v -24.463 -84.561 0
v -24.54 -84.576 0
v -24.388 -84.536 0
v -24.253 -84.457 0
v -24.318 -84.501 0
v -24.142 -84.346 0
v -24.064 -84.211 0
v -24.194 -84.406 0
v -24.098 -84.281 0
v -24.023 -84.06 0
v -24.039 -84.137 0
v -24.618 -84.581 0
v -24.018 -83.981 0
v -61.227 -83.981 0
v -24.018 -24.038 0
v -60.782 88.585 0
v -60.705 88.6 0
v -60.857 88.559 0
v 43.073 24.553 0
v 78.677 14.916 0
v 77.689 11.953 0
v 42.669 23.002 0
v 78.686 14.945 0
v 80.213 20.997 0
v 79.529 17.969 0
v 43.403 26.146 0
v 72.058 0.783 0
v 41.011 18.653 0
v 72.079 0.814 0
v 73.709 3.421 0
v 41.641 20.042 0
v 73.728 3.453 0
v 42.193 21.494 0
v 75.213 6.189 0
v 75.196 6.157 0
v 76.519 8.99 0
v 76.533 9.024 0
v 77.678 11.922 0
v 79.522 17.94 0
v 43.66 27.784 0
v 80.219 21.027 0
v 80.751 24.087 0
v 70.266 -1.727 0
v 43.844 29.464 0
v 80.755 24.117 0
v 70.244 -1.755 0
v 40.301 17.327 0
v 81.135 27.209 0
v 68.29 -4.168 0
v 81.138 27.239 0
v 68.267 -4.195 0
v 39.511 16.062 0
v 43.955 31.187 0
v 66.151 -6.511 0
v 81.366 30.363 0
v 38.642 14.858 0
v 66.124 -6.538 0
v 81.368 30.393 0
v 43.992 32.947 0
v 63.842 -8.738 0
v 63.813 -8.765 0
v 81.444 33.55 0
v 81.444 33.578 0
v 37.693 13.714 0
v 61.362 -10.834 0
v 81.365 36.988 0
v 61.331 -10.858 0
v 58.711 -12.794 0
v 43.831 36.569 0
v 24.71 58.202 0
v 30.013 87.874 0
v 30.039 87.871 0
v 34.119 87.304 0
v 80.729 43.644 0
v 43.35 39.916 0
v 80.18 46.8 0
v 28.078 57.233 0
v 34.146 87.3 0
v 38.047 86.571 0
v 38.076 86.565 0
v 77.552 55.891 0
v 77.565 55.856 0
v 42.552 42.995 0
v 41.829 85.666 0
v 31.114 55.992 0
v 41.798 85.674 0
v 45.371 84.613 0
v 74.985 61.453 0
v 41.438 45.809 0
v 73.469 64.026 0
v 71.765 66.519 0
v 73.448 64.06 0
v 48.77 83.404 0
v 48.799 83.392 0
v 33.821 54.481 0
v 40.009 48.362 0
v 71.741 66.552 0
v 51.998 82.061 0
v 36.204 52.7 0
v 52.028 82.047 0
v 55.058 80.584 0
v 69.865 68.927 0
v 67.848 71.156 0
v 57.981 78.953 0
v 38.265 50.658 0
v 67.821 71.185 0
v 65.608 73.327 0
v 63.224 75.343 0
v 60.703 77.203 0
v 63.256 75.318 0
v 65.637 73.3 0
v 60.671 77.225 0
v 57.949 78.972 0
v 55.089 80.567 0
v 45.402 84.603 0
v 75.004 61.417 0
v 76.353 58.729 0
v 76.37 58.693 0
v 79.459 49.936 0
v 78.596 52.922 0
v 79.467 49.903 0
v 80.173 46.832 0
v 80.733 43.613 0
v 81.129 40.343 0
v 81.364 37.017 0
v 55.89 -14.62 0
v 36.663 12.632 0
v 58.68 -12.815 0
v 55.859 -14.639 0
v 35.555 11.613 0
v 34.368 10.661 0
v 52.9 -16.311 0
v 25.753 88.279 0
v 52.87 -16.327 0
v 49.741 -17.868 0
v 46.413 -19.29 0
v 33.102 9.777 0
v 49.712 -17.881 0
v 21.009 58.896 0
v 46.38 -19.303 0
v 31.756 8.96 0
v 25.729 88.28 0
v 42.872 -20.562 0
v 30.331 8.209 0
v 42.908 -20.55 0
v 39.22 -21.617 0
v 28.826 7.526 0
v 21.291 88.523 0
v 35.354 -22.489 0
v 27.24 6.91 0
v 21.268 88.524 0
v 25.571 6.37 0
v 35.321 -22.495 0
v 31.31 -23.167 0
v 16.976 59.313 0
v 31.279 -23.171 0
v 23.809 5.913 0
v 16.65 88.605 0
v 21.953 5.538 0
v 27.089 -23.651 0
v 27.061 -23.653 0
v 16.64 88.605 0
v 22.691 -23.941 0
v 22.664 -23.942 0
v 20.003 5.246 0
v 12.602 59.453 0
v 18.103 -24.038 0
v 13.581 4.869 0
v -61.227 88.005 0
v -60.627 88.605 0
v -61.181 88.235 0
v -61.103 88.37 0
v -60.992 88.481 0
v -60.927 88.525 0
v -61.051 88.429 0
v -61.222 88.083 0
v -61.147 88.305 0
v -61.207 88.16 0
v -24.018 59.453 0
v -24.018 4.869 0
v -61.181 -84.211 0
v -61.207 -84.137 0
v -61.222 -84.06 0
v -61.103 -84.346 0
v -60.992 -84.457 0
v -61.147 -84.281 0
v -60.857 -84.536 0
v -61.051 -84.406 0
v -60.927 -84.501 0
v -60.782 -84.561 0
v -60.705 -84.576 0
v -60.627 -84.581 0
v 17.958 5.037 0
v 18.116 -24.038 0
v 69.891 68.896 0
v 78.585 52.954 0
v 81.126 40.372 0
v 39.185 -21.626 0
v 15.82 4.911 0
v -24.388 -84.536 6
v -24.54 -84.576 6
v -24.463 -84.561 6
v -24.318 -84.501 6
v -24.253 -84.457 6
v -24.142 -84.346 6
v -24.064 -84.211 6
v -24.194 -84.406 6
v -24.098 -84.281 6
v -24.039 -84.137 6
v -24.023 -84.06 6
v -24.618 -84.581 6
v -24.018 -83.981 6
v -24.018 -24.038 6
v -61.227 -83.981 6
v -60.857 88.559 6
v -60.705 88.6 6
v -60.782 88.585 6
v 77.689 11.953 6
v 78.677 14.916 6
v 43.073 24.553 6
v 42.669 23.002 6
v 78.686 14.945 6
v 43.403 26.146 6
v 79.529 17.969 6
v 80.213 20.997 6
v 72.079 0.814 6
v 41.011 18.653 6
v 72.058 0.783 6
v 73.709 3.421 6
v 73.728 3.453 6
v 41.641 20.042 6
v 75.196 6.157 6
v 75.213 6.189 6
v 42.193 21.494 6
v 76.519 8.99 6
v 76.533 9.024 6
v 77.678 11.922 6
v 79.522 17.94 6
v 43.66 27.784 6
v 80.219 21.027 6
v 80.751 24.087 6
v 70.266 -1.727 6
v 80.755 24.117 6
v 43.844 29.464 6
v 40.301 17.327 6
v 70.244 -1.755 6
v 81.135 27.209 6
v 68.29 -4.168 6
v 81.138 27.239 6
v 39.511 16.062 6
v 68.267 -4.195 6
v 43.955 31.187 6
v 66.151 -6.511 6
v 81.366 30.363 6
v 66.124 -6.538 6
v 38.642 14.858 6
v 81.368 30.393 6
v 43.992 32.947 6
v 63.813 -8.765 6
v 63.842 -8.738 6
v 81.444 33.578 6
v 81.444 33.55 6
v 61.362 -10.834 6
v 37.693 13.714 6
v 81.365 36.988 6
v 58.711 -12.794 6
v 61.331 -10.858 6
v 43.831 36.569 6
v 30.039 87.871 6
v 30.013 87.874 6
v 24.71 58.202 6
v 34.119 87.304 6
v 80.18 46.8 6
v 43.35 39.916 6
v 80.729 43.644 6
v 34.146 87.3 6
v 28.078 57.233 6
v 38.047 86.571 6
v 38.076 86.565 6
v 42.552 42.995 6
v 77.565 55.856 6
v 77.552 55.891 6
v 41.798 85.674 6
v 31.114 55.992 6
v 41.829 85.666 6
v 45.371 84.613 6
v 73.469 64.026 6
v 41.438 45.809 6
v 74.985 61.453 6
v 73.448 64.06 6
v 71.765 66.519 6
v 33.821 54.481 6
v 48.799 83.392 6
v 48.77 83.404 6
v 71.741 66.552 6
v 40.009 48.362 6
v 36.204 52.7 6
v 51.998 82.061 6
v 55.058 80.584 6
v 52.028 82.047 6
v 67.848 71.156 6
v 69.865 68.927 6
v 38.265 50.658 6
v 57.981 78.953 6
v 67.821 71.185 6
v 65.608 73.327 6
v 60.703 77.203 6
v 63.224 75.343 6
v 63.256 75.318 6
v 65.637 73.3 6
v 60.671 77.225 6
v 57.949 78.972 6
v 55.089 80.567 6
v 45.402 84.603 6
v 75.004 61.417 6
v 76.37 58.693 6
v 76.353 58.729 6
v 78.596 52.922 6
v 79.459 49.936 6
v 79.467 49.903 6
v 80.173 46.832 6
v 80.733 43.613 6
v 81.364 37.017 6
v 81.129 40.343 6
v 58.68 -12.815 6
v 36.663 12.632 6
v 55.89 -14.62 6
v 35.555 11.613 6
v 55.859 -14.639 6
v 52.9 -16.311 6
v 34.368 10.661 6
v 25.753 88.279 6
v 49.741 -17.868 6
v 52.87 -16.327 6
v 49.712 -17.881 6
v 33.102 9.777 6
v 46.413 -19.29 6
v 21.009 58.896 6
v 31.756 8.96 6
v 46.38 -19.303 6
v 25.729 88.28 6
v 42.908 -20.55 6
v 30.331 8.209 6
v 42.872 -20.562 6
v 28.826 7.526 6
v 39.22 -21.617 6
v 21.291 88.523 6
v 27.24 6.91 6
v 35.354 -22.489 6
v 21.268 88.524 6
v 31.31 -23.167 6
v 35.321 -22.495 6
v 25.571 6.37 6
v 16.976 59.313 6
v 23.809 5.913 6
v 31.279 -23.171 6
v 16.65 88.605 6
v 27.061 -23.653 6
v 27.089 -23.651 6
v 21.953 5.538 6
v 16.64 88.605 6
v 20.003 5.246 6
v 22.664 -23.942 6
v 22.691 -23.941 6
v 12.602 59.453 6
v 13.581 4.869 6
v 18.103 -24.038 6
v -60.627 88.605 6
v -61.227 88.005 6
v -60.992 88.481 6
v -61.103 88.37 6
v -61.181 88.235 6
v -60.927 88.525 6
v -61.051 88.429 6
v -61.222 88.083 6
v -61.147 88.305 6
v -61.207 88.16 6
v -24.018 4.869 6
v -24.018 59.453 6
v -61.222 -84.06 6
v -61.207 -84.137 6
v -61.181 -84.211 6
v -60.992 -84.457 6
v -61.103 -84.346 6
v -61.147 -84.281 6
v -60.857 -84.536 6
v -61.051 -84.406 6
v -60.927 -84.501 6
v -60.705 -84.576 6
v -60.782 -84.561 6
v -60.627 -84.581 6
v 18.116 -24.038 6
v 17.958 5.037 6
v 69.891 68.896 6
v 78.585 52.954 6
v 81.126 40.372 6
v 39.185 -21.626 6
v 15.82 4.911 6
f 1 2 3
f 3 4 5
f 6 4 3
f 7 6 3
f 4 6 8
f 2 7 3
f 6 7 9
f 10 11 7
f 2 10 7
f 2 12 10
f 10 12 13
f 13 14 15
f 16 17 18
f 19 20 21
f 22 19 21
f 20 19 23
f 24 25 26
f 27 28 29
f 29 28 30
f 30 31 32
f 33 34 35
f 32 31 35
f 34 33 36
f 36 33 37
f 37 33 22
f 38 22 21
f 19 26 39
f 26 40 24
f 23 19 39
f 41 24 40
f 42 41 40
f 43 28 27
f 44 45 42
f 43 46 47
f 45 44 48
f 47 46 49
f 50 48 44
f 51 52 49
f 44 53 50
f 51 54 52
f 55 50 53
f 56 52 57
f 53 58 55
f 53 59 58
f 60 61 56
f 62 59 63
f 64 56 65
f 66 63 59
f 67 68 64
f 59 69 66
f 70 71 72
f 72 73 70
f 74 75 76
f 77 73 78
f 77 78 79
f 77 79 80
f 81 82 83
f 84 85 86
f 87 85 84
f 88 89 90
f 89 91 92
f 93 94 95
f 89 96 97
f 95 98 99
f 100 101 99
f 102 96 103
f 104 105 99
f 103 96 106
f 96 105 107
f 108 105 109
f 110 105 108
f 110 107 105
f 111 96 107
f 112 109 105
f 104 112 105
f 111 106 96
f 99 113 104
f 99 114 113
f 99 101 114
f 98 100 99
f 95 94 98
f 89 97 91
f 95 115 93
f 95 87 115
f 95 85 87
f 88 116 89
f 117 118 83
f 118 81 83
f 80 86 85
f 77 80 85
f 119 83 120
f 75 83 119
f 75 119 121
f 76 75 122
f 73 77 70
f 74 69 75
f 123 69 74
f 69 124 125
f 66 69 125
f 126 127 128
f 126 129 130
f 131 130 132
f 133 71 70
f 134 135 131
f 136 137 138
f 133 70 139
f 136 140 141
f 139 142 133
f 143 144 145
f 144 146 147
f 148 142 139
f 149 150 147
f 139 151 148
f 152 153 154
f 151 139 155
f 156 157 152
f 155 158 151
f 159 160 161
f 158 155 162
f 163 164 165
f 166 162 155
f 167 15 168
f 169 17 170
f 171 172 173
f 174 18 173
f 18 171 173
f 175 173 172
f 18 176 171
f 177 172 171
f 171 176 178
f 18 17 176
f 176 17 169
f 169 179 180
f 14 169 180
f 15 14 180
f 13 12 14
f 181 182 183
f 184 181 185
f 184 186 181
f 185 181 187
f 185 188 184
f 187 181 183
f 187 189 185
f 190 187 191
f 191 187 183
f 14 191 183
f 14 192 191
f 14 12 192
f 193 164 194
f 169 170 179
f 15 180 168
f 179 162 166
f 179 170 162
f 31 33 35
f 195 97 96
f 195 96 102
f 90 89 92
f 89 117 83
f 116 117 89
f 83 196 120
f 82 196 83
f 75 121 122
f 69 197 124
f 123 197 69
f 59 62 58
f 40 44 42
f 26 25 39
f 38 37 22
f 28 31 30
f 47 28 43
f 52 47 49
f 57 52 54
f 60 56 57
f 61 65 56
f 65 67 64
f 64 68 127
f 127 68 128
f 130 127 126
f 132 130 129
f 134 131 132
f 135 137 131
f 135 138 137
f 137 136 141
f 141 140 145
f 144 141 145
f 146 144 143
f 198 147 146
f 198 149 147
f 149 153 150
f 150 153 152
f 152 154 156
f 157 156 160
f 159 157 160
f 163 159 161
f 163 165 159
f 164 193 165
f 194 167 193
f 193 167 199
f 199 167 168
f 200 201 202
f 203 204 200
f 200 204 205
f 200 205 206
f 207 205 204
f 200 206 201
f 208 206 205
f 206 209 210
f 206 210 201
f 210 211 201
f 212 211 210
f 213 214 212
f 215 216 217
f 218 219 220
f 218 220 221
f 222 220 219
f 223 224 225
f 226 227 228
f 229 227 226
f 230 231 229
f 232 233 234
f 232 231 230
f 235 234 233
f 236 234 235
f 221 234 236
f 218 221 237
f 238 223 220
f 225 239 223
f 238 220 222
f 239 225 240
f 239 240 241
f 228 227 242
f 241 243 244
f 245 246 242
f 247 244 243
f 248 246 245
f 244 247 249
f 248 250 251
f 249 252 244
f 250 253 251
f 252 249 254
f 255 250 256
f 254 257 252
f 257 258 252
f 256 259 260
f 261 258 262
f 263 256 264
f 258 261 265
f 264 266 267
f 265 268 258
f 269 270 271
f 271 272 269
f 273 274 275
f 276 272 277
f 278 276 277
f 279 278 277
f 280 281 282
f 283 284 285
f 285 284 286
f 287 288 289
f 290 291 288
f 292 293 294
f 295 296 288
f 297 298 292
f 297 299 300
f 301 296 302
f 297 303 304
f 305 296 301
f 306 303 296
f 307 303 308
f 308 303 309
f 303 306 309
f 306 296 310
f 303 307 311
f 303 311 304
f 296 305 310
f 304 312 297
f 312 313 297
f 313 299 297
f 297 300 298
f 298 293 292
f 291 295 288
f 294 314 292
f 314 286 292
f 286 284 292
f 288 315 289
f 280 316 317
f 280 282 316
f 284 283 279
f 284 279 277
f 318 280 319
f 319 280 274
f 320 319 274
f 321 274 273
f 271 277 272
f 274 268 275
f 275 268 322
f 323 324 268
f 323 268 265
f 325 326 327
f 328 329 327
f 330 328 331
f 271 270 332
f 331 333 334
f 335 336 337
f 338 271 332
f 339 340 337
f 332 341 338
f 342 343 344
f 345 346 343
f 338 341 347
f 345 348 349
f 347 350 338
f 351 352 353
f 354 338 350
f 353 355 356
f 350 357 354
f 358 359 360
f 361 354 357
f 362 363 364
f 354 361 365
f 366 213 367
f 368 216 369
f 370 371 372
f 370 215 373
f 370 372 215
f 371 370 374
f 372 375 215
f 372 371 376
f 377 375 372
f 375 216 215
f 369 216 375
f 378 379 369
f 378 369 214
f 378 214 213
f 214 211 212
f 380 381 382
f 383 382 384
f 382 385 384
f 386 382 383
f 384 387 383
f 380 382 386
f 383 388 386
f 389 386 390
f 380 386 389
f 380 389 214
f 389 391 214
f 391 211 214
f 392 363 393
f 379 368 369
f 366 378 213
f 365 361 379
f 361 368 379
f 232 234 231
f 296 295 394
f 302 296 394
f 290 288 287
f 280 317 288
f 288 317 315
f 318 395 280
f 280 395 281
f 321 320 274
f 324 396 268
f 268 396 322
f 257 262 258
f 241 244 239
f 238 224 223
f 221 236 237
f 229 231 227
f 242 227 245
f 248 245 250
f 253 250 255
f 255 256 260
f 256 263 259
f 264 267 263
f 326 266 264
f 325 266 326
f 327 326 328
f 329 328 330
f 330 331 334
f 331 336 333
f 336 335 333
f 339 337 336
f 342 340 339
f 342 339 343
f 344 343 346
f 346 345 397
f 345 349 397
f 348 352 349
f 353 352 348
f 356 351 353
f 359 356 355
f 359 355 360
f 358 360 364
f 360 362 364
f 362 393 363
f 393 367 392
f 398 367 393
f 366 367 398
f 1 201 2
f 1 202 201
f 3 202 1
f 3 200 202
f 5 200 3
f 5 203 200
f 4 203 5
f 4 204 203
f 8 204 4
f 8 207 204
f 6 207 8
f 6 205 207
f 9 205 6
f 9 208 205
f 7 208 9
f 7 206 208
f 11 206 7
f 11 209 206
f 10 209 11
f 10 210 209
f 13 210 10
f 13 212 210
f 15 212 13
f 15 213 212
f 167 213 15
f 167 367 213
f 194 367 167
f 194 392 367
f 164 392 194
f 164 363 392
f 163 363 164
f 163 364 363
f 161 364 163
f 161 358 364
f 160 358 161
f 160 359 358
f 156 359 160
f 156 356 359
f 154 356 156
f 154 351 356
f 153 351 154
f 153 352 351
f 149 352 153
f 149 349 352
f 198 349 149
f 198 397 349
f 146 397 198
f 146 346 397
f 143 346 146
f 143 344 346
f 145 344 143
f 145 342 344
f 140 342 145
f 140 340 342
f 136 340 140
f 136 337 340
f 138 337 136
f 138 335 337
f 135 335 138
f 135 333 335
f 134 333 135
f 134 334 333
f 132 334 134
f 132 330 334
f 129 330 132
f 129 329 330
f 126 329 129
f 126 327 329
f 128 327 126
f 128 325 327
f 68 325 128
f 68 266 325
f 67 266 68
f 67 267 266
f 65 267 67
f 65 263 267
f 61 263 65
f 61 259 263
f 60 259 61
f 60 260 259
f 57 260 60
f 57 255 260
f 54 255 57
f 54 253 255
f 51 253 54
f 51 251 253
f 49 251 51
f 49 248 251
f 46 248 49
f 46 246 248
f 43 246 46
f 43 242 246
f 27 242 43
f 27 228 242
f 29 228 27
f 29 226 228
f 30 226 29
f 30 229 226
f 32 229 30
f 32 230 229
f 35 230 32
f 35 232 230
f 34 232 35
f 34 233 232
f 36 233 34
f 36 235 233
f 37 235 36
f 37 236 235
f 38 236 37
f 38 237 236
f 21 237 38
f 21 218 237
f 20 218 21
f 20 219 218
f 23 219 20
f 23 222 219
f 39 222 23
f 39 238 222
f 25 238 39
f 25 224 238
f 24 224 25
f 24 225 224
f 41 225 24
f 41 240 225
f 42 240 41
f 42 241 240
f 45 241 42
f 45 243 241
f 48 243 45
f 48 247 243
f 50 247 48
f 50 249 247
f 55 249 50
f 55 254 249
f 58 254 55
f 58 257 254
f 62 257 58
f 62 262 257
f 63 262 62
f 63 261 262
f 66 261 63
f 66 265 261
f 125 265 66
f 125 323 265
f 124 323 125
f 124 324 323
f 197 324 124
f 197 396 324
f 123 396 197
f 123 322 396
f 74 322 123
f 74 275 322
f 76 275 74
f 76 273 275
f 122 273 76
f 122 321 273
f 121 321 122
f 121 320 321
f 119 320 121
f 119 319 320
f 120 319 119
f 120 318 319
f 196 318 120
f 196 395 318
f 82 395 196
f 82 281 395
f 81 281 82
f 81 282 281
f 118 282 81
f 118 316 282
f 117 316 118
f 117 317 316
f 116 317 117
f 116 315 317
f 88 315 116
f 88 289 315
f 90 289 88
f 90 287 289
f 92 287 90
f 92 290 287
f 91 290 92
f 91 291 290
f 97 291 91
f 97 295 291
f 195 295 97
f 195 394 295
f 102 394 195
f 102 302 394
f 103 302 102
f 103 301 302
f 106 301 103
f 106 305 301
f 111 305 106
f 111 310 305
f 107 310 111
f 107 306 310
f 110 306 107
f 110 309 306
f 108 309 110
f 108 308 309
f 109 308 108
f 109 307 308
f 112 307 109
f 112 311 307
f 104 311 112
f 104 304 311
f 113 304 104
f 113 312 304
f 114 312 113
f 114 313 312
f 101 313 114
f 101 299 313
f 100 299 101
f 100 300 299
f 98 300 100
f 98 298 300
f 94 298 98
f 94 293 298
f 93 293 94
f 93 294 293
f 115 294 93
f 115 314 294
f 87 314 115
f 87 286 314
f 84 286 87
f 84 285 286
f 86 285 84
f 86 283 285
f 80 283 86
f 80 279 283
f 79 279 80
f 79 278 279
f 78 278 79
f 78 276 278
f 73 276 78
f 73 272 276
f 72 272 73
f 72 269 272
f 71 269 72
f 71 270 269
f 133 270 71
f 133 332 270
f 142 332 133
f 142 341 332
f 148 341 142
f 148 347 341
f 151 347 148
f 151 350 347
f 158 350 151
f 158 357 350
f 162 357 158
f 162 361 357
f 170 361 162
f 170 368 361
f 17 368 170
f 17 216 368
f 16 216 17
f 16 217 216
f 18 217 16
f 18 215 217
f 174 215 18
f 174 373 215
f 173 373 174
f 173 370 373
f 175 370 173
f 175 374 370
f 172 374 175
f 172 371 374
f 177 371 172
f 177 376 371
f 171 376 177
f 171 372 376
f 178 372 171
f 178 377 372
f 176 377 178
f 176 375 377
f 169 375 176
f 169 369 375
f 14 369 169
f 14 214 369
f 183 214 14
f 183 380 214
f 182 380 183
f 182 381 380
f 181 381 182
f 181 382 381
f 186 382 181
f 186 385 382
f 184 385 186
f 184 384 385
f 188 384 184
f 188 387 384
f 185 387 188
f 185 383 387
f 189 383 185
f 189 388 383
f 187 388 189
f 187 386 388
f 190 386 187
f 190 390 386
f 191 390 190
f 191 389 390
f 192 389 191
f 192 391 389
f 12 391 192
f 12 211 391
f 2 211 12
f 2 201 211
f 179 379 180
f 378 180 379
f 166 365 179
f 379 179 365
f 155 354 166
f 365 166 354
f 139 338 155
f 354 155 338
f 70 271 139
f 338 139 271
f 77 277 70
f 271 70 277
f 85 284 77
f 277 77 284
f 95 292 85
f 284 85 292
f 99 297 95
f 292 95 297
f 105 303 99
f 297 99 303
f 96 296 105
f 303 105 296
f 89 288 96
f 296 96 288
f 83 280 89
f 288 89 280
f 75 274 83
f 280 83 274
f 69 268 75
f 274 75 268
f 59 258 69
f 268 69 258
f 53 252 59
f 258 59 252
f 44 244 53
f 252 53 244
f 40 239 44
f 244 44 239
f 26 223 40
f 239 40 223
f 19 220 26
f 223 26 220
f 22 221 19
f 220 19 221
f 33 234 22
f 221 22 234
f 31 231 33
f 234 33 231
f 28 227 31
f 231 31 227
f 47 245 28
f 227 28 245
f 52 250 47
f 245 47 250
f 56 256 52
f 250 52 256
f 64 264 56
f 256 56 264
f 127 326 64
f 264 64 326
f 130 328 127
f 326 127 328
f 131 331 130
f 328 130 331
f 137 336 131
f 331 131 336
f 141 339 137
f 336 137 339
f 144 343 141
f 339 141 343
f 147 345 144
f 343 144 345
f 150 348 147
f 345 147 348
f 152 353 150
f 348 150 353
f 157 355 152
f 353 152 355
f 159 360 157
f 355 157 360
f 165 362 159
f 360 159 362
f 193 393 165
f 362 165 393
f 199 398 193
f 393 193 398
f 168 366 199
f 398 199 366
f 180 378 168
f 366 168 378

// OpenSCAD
// Nested decorative lettering. Each element uses this OpenSCAD vector layout:
// [type, text, font, icon, svgPath, x, y, size, thickness, bold, placement, inset, children, color]
// @formforge-nested-tree max-depth=4
decorative_layers = [];

/* [Main Letter] */
main_text = "P";
font_name = "Liberation Sans:style=Bold";
main_size_mm = 180; // [20:1:210]
main_thickness_mm = 6; // [1:0.2:20]
main_bold_mm = 0.6; // [0:0.1:4]

$fn = 48;

module decorative_icon(icon_name, size_mm) {
    scale([size_mm, size_mm])
        if (icon_name == "Star")
            polygon(points = [for (i = [0 : 9])
                let(a = 90 + i * 36, r = (i % 2 == 0) ? 0.5 : 0.23)
                    [r * cos(a), r * sin(a)]]);
        else if (icon_name == "Heart")
            polygon(points = [[0,-0.5],[-0.46,-0.05],[-0.5,0.14],[-0.46,0.33],[-0.34,0.47],[-0.17,0.5],[0,0.35],[0.17,0.5],[0.34,0.47],[0.46,0.33],[0.5,0.14],[0.46,-0.05]]);
        else if (icon_name == "Flower")
            union() { for (a = [0 : 60 : 300]) rotate(a) translate([0,0.25]) circle(d=0.48); circle(d=0.3); }
        else if (icon_name == "Diamond")
            polygon(points = [[0,0.5],[0.42,0],[0,-0.5],[-0.42,0]]);
        else if (icon_name == "Plus")
            union() { square([0.28,1], center=true); square([1,0.28], center=true); }
        else if (icon_name == "Lightning")
            polygon(points = [[0.12,0.5],[-0.34,-0.03],[-0.04,-0.03],[-0.16,-0.5],[0.34,0.08],[0.05,0.08]]);
        else if (icon_name == "Balloon")
            union() { translate([0,0.12]) circle(d=0.82); polygon(points=[[-0.12,-0.24],[0.12,-0.24],[0,-0.42]]); hull() { translate([0,-0.39]) circle(d=0.035); translate([0.08,-0.5]) circle(d=0.035); } }
        else if (icon_name == "Crown")
            polygon(points = [[-0.48,-0.38],[-0.38,0.3],[-0.12,0.02],[0,0.48],[0.14,0.02],[0.4,0.3],[0.48,-0.38]]);
        else circle(d=0.8);
}

module main_letter() {
    color("White")
        linear_extrude(height=main_thickness_mm)
            offset(r=main_bold_mm)
                text(main_text, size=main_size_mm, font=font_name,
                    halign="center", valign="center", spacing=0.95);
}

module element_shape(element) {
    if (element[0] == "Text")
        text(element[1], size=element[7], font=element[2], halign="center", valign="center");
    else if (element[0] == "Icon")
        decorative_icon(element[3], element[7]);
    else if (element[0] == "SVG" && element[4] != "")
        resize([element[7], element[7], 0], auto=true) import(file=element[4], center=true);
}

module render_element(element, parent_x, parent_y, parent_z, parent_thickness) {
    x = parent_x + element[5];
    y = parent_y + element[6];
    z = parent_z + parent_thickness
        - (element[10] == "Inset" ? min(element[11], parent_thickness) : 0);
    color(element[13])
        translate([x,y,z])
            linear_extrude(height=element[8])
                offset(r=element[9]) element_shape(element);
    for (child = element[12])
        render_element(child, x, y, z, element[8]);
}

union() {
    main_letter();
    for (element = decorative_layers)
        render_element(element, 0, 0, 0, main_thickness_mm);
}
